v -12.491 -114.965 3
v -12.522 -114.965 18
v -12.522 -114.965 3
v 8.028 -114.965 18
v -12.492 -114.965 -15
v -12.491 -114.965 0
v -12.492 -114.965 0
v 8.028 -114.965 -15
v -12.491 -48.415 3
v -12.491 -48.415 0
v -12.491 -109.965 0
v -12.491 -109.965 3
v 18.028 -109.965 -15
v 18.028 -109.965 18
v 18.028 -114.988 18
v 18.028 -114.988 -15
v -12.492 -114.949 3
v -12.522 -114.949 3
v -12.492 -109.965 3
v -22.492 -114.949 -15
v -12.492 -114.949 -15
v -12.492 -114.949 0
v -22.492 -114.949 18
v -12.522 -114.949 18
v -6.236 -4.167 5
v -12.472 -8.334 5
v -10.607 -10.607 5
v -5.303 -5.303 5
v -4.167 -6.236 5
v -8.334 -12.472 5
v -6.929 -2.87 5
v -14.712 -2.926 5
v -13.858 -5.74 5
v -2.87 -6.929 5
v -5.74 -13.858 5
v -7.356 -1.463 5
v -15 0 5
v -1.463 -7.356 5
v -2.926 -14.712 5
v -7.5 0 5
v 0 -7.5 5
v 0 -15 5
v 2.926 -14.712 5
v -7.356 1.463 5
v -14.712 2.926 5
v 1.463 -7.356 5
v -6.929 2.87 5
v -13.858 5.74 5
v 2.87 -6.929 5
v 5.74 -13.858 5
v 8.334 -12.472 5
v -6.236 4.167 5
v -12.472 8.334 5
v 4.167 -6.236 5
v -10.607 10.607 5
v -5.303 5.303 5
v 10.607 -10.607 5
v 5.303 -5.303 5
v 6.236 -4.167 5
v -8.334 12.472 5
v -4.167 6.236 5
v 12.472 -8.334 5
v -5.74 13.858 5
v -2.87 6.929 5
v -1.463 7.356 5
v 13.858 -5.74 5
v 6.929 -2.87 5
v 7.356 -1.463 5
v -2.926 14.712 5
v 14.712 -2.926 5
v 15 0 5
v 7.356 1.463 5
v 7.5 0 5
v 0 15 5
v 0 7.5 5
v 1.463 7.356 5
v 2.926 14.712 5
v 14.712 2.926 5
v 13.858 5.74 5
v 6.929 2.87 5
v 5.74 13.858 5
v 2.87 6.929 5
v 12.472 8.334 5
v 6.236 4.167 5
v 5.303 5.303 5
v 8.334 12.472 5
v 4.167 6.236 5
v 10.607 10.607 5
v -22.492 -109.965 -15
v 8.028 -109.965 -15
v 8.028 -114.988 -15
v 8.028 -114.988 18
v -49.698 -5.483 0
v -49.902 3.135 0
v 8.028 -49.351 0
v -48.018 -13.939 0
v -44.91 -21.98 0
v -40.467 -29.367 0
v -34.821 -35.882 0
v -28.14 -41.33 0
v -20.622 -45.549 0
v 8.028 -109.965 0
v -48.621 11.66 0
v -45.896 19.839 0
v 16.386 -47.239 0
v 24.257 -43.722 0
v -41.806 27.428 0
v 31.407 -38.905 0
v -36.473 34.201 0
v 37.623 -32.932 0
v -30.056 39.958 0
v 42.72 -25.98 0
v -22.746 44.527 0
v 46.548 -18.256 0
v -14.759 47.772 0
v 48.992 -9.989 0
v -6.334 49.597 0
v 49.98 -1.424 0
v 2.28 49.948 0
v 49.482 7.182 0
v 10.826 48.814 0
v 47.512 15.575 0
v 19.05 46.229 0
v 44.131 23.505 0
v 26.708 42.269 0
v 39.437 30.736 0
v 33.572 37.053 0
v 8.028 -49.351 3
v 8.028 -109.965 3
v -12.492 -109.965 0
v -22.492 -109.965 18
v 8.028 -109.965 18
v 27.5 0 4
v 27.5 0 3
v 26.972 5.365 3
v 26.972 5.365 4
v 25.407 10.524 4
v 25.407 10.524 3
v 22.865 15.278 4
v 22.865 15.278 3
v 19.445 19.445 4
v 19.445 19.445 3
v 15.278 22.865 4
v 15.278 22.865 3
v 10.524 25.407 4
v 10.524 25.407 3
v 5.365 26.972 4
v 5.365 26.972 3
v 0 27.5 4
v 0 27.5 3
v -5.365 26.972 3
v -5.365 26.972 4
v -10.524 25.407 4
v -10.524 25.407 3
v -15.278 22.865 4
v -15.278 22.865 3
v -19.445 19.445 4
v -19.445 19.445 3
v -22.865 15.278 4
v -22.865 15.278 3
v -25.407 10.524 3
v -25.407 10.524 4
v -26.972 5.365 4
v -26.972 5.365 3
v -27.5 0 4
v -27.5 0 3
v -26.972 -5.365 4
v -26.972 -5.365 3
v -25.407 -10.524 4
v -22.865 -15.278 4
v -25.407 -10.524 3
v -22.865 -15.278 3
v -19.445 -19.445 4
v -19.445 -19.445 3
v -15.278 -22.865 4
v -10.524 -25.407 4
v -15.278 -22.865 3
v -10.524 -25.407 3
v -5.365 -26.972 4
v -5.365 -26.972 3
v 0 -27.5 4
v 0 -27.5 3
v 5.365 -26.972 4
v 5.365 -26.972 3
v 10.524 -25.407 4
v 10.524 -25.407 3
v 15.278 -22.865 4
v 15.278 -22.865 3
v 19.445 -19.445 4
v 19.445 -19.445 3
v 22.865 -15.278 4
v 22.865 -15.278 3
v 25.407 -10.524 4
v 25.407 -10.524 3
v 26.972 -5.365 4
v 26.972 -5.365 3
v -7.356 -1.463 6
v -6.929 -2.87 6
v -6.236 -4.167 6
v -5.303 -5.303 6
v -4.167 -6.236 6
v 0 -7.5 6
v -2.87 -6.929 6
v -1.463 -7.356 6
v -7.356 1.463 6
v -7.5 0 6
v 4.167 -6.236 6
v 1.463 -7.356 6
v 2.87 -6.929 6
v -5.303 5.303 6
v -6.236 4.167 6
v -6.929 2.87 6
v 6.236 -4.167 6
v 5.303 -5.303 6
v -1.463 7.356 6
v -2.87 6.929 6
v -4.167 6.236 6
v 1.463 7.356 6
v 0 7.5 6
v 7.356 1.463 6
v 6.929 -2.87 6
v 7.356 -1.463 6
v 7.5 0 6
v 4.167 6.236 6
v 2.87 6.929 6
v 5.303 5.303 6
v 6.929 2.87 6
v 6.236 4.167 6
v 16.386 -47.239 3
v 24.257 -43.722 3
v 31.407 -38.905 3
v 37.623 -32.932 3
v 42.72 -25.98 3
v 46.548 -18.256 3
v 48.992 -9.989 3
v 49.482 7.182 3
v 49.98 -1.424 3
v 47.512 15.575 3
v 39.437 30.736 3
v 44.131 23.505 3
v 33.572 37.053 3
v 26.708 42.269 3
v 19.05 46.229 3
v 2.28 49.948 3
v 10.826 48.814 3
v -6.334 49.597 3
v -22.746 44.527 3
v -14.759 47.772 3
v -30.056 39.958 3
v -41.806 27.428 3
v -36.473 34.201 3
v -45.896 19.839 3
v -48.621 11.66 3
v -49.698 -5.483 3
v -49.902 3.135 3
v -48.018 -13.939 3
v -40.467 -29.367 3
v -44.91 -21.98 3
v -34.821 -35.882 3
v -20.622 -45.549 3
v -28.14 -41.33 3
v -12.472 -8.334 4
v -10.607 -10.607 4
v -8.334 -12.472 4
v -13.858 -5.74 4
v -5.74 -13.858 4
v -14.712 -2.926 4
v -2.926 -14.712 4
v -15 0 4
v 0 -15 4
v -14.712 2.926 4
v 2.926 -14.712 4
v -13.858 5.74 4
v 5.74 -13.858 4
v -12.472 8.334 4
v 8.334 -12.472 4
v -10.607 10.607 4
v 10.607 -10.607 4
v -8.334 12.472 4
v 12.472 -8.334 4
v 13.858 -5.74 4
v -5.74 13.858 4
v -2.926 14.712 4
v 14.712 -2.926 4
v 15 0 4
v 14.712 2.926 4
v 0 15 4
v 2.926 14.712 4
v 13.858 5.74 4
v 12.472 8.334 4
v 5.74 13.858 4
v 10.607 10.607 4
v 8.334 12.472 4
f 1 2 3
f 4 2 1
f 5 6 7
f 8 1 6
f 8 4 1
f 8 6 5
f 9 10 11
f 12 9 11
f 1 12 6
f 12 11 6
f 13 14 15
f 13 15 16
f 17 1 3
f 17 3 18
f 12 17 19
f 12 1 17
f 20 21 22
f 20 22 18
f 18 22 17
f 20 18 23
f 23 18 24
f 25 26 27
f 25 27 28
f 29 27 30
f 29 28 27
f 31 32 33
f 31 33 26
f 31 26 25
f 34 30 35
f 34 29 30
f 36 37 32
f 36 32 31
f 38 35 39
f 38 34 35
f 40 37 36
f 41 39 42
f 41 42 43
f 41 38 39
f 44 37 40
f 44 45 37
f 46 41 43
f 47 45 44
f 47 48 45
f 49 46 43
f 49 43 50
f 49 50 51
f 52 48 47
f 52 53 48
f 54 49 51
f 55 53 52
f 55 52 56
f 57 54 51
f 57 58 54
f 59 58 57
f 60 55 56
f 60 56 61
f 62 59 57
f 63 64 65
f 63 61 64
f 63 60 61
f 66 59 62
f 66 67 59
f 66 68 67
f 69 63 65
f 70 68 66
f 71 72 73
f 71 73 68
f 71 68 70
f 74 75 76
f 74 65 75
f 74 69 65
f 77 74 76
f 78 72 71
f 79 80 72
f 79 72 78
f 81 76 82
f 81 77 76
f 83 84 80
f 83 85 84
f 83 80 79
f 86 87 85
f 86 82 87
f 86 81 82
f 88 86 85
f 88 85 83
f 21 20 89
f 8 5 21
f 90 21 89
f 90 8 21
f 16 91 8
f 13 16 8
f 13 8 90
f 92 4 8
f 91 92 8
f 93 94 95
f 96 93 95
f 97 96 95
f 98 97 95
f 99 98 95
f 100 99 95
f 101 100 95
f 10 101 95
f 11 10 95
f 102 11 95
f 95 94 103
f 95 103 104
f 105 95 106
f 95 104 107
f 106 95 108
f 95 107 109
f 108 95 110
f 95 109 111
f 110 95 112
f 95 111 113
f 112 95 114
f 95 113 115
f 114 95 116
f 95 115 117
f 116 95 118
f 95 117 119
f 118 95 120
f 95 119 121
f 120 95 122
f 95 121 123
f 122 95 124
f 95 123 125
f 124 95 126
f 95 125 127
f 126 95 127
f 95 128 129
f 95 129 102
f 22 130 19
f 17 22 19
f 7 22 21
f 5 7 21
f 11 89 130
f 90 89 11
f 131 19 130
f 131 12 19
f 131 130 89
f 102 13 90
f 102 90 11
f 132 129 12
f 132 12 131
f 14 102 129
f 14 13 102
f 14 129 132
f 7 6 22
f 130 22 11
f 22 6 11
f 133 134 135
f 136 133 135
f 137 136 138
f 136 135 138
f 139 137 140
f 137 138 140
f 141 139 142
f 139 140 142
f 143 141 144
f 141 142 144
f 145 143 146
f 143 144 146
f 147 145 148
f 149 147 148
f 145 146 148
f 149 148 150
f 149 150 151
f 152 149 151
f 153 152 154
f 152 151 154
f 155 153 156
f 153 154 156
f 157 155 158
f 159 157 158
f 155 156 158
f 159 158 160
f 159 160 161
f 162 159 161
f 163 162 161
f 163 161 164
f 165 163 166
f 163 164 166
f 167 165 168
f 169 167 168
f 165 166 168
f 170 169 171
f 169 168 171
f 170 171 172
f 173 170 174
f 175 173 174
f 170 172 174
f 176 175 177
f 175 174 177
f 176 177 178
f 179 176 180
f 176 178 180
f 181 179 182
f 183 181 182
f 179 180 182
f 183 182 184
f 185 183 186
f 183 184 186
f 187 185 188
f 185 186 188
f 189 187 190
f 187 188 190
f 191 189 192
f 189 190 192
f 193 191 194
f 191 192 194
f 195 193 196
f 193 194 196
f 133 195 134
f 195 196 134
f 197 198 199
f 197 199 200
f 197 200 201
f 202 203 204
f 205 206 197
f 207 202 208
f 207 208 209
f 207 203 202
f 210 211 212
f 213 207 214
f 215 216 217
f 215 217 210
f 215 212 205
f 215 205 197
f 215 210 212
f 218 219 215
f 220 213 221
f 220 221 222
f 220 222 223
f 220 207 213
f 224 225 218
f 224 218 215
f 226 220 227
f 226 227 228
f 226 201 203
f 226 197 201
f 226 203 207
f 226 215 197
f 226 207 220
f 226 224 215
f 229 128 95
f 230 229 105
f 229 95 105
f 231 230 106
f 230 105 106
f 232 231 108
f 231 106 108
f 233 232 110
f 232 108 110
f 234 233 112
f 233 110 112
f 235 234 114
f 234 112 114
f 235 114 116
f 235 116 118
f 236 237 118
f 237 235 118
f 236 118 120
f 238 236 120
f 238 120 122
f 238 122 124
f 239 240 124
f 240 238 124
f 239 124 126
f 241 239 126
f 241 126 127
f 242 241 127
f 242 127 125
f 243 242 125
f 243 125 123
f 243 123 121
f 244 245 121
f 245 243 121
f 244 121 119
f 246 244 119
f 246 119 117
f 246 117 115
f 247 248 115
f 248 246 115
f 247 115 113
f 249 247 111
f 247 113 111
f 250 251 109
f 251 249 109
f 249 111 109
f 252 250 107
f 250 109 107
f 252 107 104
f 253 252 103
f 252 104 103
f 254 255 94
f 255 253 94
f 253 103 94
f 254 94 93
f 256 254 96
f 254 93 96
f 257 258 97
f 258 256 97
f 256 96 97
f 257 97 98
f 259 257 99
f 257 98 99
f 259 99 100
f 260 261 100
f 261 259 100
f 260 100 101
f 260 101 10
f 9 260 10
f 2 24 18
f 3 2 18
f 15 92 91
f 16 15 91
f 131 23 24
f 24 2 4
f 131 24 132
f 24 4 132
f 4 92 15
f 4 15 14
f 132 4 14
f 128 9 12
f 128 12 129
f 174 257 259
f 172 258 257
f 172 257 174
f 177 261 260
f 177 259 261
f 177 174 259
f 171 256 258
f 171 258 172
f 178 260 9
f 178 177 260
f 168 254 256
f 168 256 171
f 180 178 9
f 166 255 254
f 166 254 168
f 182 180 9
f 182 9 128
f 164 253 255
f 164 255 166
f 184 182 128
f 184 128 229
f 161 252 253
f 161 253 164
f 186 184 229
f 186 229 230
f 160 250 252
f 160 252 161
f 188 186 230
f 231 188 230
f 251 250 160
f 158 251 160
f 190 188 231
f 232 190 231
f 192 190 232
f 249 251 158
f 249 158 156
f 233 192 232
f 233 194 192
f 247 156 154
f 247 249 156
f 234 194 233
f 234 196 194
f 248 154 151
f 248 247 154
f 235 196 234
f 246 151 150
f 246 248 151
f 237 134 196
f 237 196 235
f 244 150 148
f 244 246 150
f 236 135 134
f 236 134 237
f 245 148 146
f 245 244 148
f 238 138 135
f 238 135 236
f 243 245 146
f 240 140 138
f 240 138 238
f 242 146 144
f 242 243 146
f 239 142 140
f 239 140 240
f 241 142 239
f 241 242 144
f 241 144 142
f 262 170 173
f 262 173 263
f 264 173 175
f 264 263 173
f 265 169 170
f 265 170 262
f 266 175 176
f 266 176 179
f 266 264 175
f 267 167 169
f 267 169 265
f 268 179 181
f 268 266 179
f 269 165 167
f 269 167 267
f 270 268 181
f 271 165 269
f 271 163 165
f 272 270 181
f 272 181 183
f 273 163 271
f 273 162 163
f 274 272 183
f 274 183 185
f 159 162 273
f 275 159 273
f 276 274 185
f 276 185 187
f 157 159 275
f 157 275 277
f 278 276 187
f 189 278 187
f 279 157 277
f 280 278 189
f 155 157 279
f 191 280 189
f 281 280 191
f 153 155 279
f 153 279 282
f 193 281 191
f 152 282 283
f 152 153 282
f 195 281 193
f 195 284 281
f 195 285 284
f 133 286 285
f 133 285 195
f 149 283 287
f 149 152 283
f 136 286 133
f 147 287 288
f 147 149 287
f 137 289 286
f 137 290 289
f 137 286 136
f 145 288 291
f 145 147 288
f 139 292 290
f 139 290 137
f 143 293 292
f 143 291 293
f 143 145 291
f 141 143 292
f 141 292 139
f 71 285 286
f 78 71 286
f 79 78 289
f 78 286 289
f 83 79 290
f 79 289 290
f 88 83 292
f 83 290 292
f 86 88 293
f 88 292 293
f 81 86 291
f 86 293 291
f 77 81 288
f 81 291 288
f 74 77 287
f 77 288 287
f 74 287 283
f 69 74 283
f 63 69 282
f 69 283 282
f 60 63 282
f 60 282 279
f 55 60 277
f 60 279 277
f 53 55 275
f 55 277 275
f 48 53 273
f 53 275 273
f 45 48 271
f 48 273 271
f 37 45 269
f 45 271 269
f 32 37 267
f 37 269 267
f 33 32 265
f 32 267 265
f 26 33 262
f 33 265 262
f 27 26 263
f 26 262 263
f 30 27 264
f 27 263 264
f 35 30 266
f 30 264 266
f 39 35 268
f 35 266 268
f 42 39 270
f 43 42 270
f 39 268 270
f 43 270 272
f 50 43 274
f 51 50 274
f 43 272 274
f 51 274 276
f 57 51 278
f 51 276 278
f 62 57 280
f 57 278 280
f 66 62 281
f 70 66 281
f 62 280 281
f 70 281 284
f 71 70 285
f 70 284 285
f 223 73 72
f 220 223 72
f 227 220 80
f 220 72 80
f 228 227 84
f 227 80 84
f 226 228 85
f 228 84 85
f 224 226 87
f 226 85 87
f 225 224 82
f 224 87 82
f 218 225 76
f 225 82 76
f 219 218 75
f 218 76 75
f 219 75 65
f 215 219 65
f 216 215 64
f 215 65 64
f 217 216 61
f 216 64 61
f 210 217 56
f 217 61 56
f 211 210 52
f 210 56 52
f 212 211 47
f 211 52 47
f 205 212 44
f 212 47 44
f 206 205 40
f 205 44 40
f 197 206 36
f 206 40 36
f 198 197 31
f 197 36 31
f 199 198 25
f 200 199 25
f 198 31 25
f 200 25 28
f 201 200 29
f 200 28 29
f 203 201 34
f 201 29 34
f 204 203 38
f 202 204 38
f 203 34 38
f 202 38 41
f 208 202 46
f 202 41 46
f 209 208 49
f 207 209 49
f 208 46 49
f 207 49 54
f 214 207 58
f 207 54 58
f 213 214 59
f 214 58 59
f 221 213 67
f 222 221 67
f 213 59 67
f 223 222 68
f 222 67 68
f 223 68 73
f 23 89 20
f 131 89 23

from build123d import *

# Parameters (mm, degrees)
SKETCH_2_R       = 50
EXTRUDE_1_DEPTH  = 3
SKETCH_3_R       = 27.5
EXTRUDE_2_DEPTH  = 1
SKETCH_4_R       = 15
EXTRUDE_3_DEPTH  = 1
SKETCH_5_R       = 7.5
EXTRUDE_4_DEPTH  = 1
EXTRUDE_5_DEPTH  = 3
SKETCH_16_W      = 15
SKETCH_16_H      = 5
EXTRUDE_7_DEPTH  = 20.52
SKETCH_18_W      = 15
SKETCH_18_H      = 5
EXTRUDE_9_DEPTH  = 20.55
SKETCH_19_W      = 33
SKETCH_19_H      = 5.022974077
EXTRUDE_10_DEPTH = 10
SKETCH_20_W      = 33
SKETCH_20_H      = 4.984152866
EXTRUDE_11_DEPTH = 10


with BuildPart() as part:
    # 草图2 → 凸台-拉伸1 (new body)
    with BuildSketch(Plane.XY):
        Circle(SKETCH_2_R)
    extrude(amount=EXTRUDE_1_DEPTH)

    # 草图3 → 凸台-拉伸2 (add)
    with BuildSketch(Plane.XY.offset(3)):
        Circle(SKETCH_3_R)
    extrude(amount=EXTRUDE_2_DEPTH)

    # 草图4 → 凸台-拉伸3 (add)
    with BuildSketch(Plane.XY.offset(4)):
        Circle(SKETCH_4_R)
    extrude(amount=EXTRUDE_3_DEPTH)

    # 草图5 → 凸台-拉伸4 (add)
    with BuildSketch(Plane.XY.offset(5)):
        Circle(SKETCH_5_R)
    extrude(amount=EXTRUDE_4_DEPTH)

    # 草图6 → 凸台-拉伸5 (add)
    with BuildSketch(Plane.XY):
        with BuildLine():
            Line((-12.491130148, -48.414581147), (-12.491130148, -114.964581147))
            Line((-12.491130148, -114.964581147), (8.028142932, -114.964581147))
            Line((8.028142932, -114.964581147), (8.028142932, -49.351280845))
            ThreePointArc((8.028142932, -49.351280845), (-2.280113003, -49.94798379), (-12.491130148, -48.414581147))
        make_face()
    extrude(amount=EXTRUDE_5_DEPTH)

    # 草图16 → 凸台-拉伸7 (add)
    with BuildSketch(Plane(origin=(8.028142932, 0, 0), x_dir=(0, 0, -1), z_dir=(1, 0, 0))):
        with Locations((7.5, -112.464581147)):
            Rectangle(SKETCH_16_W, SKETCH_16_H)
    extrude(amount=-EXTRUDE_7_DEPTH)

    # 草图18 → 凸台-拉伸9 (add)
    with BuildSketch(Plane(origin=(8.028142932, 0, 0), x_dir=(0, 0, -1), z_dir=(1, 0, 0))):
        with Locations((-10.5, -112.464581147)):
            Rectangle(SKETCH_18_W, SKETCH_18_H)
    extrude(amount=-EXTRUDE_9_DEPTH)

    # 草图19 → 凸台-拉伸10 (add)
    with BuildSketch(Plane(origin=(8.028142932, 0, 0), x_dir=(0, 0, -1), z_dir=(1, 0, 0))):
        with Locations((-1.5, -112.476068185)):
            Rectangle(SKETCH_19_W, SKETCH_19_H)
    extrude(amount=EXTRUDE_10_DEPTH)

    # 草图20 → 凸台-拉伸11 (add)
    with BuildSketch(Plane.ZY.offset(12.491857068)):
        with Locations((1.5, -112.45665758)):
            Rectangle(SKETCH_20_W, SKETCH_20_H)
    extrude(amount=EXTRUDE_11_DEPTH)


solid = part.part
